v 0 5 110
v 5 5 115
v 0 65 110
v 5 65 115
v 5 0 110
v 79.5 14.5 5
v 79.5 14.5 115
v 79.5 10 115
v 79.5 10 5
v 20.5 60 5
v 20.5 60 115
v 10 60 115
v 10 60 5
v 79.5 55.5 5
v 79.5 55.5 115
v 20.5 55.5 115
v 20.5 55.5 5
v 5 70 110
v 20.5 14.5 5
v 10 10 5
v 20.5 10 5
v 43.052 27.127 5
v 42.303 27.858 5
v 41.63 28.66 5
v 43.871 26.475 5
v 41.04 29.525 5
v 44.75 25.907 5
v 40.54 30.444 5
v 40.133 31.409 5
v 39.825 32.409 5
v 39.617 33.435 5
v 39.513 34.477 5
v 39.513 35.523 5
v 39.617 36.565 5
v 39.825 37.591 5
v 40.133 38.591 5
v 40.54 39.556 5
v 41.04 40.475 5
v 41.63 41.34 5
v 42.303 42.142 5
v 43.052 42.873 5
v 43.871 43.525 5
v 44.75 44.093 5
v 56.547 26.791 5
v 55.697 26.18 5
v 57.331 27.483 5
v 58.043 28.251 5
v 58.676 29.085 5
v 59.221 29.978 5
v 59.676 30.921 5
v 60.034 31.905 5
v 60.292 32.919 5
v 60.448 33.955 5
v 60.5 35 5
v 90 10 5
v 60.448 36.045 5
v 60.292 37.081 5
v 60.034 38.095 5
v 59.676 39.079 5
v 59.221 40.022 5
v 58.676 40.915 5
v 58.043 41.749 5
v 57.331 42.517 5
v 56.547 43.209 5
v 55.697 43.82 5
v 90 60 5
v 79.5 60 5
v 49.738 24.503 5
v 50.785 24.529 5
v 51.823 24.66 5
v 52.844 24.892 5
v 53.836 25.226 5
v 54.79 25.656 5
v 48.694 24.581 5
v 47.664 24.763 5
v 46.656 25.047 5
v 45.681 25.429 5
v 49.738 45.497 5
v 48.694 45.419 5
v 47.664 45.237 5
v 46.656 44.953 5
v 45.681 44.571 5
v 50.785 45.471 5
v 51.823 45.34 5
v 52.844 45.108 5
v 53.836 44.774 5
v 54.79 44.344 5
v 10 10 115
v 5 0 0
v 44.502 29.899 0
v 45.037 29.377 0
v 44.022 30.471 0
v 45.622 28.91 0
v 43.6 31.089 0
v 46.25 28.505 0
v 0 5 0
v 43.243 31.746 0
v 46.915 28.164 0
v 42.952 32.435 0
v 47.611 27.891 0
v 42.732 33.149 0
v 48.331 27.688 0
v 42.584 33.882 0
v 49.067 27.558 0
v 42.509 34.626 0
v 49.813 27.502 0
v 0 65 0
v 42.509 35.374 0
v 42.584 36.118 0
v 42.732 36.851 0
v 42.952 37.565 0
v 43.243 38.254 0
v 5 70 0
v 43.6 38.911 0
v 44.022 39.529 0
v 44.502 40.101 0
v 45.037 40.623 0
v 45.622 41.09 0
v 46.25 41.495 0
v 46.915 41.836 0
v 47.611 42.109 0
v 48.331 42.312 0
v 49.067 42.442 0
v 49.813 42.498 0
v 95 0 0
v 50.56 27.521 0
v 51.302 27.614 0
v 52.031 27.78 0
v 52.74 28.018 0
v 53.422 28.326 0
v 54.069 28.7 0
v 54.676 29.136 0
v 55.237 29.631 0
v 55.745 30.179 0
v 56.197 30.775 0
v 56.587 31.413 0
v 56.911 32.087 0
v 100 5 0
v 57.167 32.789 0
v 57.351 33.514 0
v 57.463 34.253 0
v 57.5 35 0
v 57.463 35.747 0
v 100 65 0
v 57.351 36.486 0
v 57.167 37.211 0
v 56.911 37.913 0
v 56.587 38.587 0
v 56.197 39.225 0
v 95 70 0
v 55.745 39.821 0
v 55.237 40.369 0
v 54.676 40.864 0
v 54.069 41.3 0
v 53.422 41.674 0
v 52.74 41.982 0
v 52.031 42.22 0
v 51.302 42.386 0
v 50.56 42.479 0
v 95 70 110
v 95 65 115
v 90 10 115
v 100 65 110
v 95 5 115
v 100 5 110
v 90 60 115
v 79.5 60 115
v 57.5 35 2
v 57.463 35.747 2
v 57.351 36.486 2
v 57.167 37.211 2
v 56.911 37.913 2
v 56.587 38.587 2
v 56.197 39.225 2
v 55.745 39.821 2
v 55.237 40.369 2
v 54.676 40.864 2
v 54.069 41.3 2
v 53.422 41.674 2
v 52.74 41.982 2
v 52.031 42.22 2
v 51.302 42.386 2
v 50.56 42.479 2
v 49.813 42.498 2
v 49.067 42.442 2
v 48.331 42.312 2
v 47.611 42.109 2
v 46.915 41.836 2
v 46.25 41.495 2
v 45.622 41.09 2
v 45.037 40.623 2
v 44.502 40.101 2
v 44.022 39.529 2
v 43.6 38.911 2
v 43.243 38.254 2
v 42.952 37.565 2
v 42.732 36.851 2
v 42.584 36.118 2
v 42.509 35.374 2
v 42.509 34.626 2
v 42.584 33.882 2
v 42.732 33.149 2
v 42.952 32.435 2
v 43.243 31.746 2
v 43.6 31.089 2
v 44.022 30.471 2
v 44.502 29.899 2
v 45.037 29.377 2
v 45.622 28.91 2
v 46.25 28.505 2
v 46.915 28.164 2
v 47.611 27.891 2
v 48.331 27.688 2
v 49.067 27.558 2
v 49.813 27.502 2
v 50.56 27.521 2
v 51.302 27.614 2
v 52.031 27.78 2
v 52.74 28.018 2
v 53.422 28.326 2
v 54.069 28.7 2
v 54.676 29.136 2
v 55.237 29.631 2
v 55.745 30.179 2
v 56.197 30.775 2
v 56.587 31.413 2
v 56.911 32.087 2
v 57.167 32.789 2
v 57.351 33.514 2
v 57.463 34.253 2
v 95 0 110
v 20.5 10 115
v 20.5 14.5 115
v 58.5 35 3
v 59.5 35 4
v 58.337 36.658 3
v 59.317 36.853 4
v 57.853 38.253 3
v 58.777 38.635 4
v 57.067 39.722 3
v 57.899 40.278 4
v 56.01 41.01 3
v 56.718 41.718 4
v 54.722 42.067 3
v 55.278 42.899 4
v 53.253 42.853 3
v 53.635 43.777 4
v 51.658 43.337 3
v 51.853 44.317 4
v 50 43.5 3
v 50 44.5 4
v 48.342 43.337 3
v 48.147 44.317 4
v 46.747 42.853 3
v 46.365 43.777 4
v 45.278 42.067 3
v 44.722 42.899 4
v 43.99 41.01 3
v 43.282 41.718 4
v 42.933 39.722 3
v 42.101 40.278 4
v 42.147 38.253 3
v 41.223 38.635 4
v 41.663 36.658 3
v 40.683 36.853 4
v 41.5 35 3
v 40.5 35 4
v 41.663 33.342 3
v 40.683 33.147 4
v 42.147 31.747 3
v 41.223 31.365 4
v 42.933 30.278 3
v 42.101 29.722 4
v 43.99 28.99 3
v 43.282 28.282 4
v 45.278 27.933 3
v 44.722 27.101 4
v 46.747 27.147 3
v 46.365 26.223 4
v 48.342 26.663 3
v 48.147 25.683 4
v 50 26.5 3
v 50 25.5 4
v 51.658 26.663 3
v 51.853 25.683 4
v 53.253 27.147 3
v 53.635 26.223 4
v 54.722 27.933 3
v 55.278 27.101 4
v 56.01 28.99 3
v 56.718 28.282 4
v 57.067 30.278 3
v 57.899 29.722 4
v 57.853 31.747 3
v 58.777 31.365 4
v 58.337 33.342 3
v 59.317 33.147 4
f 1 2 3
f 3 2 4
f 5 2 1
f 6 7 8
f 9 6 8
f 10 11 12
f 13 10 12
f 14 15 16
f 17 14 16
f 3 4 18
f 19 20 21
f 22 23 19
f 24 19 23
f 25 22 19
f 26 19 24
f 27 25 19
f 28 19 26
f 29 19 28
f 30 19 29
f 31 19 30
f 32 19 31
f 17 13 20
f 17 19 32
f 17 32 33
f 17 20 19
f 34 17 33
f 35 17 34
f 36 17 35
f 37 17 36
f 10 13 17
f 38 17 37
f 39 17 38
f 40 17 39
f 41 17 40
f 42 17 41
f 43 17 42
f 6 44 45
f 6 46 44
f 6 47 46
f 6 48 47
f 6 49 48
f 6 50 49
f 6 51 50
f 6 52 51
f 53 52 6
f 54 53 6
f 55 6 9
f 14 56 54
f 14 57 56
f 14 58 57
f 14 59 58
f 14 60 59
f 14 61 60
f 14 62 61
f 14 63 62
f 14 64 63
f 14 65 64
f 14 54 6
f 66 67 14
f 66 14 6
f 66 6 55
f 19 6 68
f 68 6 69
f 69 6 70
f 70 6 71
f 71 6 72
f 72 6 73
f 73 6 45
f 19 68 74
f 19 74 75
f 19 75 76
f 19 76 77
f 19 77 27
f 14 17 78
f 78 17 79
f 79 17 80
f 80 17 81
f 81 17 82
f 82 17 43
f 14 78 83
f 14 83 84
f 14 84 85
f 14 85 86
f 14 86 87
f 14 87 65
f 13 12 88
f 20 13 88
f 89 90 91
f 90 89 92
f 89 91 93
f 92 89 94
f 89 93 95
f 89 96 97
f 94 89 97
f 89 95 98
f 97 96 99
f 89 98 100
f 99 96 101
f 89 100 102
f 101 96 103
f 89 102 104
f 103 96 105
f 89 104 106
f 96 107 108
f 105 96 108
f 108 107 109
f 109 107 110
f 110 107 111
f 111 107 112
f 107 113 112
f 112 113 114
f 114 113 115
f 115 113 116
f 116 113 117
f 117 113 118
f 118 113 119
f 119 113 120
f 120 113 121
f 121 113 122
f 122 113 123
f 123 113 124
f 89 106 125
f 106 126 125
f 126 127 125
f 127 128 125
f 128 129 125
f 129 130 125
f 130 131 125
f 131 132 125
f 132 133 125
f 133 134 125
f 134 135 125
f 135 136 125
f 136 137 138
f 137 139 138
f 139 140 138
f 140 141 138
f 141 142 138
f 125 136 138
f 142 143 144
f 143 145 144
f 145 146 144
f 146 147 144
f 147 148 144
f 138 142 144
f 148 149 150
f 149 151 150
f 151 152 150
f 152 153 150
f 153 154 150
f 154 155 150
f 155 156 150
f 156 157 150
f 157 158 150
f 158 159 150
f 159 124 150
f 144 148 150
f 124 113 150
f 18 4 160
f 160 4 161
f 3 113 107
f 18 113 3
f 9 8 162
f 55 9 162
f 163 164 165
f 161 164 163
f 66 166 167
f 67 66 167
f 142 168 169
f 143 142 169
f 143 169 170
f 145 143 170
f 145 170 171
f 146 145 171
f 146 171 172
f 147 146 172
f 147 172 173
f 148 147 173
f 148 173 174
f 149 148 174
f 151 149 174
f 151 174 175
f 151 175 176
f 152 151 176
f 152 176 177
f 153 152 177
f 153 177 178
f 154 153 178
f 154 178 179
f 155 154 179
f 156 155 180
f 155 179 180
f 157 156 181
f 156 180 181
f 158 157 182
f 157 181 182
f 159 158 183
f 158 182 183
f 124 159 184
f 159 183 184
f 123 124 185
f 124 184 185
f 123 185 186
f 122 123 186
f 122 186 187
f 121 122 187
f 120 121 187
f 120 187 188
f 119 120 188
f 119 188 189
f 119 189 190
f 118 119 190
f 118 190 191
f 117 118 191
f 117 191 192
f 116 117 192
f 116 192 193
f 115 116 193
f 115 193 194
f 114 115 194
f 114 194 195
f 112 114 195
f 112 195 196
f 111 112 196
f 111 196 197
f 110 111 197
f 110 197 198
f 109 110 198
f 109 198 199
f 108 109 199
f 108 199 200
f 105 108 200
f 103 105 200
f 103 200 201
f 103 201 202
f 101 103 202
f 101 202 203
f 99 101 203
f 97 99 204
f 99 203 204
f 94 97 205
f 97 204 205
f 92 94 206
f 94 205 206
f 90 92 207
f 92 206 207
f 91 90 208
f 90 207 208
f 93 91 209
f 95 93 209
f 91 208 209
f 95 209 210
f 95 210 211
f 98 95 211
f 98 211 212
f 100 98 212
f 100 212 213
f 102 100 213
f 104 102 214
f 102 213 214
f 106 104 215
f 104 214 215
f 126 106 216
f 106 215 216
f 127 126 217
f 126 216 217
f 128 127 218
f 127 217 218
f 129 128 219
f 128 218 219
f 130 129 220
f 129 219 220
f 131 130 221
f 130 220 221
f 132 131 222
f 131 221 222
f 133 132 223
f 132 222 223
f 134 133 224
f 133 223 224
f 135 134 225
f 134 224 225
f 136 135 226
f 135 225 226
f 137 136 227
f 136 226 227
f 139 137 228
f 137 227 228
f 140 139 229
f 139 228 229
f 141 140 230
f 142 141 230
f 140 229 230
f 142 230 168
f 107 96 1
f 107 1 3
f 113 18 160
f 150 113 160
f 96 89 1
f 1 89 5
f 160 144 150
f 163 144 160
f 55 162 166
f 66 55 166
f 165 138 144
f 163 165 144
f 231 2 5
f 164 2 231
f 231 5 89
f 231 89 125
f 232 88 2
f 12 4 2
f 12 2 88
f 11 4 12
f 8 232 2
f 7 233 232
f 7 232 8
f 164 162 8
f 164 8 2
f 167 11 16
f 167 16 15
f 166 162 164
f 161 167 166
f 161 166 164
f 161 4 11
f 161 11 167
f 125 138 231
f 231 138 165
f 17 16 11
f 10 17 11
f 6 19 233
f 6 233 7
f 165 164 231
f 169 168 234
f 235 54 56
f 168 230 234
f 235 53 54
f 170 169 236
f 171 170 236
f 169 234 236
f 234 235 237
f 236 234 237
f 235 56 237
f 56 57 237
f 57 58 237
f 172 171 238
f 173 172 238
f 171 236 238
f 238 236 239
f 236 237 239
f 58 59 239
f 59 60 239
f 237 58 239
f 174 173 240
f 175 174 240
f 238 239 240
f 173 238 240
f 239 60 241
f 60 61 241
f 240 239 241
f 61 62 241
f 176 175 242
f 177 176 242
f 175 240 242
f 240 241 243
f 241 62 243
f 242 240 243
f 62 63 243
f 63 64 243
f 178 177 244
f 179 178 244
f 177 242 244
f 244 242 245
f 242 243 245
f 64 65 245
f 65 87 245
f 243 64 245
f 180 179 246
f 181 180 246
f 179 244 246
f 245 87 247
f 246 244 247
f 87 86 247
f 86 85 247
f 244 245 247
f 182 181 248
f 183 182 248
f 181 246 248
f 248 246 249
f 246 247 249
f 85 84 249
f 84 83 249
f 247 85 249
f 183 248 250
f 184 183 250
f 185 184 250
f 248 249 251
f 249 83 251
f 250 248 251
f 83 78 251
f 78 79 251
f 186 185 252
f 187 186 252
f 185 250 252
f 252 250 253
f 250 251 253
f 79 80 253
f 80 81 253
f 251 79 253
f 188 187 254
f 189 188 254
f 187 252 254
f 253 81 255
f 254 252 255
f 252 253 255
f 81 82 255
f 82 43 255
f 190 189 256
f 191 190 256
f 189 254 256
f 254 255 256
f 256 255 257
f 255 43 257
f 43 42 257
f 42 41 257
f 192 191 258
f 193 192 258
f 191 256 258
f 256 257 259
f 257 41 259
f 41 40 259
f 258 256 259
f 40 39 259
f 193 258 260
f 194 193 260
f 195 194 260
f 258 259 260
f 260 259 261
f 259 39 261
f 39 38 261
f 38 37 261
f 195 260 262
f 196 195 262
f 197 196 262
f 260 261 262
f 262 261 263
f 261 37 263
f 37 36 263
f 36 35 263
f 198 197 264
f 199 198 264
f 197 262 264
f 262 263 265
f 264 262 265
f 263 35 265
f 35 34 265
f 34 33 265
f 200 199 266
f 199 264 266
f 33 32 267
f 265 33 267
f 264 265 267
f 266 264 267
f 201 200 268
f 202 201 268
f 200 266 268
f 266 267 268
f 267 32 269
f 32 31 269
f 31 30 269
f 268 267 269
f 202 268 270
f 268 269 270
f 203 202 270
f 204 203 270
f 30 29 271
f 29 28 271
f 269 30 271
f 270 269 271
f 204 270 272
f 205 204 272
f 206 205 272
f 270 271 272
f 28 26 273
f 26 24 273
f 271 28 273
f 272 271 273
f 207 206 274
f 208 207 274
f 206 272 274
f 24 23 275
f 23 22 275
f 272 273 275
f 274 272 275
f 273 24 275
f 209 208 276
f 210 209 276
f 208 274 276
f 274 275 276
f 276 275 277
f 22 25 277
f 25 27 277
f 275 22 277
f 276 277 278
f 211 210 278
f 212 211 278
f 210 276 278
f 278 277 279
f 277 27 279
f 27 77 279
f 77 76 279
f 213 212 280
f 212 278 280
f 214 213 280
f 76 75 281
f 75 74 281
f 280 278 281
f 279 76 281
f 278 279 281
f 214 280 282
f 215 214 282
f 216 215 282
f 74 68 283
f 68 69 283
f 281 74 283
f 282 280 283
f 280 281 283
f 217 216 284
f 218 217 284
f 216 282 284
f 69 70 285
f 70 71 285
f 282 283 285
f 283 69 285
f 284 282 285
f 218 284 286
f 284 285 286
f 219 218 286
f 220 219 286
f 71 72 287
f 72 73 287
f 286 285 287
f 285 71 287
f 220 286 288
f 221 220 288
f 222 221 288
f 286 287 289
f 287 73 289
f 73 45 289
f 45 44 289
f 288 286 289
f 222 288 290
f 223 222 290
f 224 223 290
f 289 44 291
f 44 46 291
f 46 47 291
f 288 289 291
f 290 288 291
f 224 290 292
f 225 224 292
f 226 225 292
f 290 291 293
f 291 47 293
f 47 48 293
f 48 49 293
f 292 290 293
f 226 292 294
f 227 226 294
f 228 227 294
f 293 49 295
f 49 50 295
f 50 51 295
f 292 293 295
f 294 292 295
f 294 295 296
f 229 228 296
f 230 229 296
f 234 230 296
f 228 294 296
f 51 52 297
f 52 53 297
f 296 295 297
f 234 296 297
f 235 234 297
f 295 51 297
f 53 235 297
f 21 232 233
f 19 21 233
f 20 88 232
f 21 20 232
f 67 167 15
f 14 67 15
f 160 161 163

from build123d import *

# Parameters (mm, degrees)
F0_W     = 100
F0_H     = 70
F1_DEPTH = 115
F3_DEPTH = 110
F4_R     = 7.5
F5_DEPTH = 25
F6_SIZE  = 3
F7_SIZE  = 5


with BuildPart() as f1:
    # F0 (on Top) → F1 (new body)
    with BuildSketch(Plane.XY):
        with Locations((50, 35)):
            Rectangle(F0_W, F0_H)
    extrude(amount=F1_DEPTH)

    # F2 (on face) → F3 (cut)
    with BuildSketch(Plane.XY.offset(115)):
        Polygon((20.5, 60), (10, 60), (10, 50.309684), (20.5, 50.309684), (20.5, 55.5), align=None)
        Polygon((90, 60), (79.5, 60), (79.5, 55.5), (79.5, 51), (90, 51), align=None)
        Polygon((20.5, 19), (10, 19), (10, 10), (20.5, 10), (20.5, 14.5), align=None)
        Polygon((90, 10), (90, 19.087384), (79.5, 19.087384), (79.5, 14.5), (79.5, 10), align=None)
        Polygon((20.5, 50.309684), (10, 50.309684), (10, 19), (20.5, 19), (20.5, 14.5), (79.5, 14.5), (79.5, 19.087384), (90, 19.087384), (90, 51), (79.5, 51), (79.5, 55.5), (20.5, 55.5), align=None)
    extrude(amount=-F3_DEPTH, mode=Mode.SUBTRACT)

    # F4 (on face) → F5 (cut)
    with BuildSketch(Plane.XY.offset(5)):
        with Locations((50, 35)):
            Circle(F4_R)
    extrude(amount=-F5_DEPTH, mode=Mode.SUBTRACT)

    # F6
    f6_edges = [f1.edges().sort_by_distance(p)[0] for p in [
        (42.5, 35, 5),
    ]]
    chamfer(f6_edges, length=F6_SIZE)

    # F7
    f7_edges = [f1.edges().sort_by_distance(p)[0] for p in [
        (0, 35, 115),
        (50, 0, 115),
        (100, 35, 115),
        (50, 70, 115),
        (100, 0, 57.5),
        (100, 70, 57.5),
        (0, 70, 57.5),
        (0, 0, 57.5),
    ]]
    chamfer(f7_edges, length=F7_SIZE)


solid = f1.part
